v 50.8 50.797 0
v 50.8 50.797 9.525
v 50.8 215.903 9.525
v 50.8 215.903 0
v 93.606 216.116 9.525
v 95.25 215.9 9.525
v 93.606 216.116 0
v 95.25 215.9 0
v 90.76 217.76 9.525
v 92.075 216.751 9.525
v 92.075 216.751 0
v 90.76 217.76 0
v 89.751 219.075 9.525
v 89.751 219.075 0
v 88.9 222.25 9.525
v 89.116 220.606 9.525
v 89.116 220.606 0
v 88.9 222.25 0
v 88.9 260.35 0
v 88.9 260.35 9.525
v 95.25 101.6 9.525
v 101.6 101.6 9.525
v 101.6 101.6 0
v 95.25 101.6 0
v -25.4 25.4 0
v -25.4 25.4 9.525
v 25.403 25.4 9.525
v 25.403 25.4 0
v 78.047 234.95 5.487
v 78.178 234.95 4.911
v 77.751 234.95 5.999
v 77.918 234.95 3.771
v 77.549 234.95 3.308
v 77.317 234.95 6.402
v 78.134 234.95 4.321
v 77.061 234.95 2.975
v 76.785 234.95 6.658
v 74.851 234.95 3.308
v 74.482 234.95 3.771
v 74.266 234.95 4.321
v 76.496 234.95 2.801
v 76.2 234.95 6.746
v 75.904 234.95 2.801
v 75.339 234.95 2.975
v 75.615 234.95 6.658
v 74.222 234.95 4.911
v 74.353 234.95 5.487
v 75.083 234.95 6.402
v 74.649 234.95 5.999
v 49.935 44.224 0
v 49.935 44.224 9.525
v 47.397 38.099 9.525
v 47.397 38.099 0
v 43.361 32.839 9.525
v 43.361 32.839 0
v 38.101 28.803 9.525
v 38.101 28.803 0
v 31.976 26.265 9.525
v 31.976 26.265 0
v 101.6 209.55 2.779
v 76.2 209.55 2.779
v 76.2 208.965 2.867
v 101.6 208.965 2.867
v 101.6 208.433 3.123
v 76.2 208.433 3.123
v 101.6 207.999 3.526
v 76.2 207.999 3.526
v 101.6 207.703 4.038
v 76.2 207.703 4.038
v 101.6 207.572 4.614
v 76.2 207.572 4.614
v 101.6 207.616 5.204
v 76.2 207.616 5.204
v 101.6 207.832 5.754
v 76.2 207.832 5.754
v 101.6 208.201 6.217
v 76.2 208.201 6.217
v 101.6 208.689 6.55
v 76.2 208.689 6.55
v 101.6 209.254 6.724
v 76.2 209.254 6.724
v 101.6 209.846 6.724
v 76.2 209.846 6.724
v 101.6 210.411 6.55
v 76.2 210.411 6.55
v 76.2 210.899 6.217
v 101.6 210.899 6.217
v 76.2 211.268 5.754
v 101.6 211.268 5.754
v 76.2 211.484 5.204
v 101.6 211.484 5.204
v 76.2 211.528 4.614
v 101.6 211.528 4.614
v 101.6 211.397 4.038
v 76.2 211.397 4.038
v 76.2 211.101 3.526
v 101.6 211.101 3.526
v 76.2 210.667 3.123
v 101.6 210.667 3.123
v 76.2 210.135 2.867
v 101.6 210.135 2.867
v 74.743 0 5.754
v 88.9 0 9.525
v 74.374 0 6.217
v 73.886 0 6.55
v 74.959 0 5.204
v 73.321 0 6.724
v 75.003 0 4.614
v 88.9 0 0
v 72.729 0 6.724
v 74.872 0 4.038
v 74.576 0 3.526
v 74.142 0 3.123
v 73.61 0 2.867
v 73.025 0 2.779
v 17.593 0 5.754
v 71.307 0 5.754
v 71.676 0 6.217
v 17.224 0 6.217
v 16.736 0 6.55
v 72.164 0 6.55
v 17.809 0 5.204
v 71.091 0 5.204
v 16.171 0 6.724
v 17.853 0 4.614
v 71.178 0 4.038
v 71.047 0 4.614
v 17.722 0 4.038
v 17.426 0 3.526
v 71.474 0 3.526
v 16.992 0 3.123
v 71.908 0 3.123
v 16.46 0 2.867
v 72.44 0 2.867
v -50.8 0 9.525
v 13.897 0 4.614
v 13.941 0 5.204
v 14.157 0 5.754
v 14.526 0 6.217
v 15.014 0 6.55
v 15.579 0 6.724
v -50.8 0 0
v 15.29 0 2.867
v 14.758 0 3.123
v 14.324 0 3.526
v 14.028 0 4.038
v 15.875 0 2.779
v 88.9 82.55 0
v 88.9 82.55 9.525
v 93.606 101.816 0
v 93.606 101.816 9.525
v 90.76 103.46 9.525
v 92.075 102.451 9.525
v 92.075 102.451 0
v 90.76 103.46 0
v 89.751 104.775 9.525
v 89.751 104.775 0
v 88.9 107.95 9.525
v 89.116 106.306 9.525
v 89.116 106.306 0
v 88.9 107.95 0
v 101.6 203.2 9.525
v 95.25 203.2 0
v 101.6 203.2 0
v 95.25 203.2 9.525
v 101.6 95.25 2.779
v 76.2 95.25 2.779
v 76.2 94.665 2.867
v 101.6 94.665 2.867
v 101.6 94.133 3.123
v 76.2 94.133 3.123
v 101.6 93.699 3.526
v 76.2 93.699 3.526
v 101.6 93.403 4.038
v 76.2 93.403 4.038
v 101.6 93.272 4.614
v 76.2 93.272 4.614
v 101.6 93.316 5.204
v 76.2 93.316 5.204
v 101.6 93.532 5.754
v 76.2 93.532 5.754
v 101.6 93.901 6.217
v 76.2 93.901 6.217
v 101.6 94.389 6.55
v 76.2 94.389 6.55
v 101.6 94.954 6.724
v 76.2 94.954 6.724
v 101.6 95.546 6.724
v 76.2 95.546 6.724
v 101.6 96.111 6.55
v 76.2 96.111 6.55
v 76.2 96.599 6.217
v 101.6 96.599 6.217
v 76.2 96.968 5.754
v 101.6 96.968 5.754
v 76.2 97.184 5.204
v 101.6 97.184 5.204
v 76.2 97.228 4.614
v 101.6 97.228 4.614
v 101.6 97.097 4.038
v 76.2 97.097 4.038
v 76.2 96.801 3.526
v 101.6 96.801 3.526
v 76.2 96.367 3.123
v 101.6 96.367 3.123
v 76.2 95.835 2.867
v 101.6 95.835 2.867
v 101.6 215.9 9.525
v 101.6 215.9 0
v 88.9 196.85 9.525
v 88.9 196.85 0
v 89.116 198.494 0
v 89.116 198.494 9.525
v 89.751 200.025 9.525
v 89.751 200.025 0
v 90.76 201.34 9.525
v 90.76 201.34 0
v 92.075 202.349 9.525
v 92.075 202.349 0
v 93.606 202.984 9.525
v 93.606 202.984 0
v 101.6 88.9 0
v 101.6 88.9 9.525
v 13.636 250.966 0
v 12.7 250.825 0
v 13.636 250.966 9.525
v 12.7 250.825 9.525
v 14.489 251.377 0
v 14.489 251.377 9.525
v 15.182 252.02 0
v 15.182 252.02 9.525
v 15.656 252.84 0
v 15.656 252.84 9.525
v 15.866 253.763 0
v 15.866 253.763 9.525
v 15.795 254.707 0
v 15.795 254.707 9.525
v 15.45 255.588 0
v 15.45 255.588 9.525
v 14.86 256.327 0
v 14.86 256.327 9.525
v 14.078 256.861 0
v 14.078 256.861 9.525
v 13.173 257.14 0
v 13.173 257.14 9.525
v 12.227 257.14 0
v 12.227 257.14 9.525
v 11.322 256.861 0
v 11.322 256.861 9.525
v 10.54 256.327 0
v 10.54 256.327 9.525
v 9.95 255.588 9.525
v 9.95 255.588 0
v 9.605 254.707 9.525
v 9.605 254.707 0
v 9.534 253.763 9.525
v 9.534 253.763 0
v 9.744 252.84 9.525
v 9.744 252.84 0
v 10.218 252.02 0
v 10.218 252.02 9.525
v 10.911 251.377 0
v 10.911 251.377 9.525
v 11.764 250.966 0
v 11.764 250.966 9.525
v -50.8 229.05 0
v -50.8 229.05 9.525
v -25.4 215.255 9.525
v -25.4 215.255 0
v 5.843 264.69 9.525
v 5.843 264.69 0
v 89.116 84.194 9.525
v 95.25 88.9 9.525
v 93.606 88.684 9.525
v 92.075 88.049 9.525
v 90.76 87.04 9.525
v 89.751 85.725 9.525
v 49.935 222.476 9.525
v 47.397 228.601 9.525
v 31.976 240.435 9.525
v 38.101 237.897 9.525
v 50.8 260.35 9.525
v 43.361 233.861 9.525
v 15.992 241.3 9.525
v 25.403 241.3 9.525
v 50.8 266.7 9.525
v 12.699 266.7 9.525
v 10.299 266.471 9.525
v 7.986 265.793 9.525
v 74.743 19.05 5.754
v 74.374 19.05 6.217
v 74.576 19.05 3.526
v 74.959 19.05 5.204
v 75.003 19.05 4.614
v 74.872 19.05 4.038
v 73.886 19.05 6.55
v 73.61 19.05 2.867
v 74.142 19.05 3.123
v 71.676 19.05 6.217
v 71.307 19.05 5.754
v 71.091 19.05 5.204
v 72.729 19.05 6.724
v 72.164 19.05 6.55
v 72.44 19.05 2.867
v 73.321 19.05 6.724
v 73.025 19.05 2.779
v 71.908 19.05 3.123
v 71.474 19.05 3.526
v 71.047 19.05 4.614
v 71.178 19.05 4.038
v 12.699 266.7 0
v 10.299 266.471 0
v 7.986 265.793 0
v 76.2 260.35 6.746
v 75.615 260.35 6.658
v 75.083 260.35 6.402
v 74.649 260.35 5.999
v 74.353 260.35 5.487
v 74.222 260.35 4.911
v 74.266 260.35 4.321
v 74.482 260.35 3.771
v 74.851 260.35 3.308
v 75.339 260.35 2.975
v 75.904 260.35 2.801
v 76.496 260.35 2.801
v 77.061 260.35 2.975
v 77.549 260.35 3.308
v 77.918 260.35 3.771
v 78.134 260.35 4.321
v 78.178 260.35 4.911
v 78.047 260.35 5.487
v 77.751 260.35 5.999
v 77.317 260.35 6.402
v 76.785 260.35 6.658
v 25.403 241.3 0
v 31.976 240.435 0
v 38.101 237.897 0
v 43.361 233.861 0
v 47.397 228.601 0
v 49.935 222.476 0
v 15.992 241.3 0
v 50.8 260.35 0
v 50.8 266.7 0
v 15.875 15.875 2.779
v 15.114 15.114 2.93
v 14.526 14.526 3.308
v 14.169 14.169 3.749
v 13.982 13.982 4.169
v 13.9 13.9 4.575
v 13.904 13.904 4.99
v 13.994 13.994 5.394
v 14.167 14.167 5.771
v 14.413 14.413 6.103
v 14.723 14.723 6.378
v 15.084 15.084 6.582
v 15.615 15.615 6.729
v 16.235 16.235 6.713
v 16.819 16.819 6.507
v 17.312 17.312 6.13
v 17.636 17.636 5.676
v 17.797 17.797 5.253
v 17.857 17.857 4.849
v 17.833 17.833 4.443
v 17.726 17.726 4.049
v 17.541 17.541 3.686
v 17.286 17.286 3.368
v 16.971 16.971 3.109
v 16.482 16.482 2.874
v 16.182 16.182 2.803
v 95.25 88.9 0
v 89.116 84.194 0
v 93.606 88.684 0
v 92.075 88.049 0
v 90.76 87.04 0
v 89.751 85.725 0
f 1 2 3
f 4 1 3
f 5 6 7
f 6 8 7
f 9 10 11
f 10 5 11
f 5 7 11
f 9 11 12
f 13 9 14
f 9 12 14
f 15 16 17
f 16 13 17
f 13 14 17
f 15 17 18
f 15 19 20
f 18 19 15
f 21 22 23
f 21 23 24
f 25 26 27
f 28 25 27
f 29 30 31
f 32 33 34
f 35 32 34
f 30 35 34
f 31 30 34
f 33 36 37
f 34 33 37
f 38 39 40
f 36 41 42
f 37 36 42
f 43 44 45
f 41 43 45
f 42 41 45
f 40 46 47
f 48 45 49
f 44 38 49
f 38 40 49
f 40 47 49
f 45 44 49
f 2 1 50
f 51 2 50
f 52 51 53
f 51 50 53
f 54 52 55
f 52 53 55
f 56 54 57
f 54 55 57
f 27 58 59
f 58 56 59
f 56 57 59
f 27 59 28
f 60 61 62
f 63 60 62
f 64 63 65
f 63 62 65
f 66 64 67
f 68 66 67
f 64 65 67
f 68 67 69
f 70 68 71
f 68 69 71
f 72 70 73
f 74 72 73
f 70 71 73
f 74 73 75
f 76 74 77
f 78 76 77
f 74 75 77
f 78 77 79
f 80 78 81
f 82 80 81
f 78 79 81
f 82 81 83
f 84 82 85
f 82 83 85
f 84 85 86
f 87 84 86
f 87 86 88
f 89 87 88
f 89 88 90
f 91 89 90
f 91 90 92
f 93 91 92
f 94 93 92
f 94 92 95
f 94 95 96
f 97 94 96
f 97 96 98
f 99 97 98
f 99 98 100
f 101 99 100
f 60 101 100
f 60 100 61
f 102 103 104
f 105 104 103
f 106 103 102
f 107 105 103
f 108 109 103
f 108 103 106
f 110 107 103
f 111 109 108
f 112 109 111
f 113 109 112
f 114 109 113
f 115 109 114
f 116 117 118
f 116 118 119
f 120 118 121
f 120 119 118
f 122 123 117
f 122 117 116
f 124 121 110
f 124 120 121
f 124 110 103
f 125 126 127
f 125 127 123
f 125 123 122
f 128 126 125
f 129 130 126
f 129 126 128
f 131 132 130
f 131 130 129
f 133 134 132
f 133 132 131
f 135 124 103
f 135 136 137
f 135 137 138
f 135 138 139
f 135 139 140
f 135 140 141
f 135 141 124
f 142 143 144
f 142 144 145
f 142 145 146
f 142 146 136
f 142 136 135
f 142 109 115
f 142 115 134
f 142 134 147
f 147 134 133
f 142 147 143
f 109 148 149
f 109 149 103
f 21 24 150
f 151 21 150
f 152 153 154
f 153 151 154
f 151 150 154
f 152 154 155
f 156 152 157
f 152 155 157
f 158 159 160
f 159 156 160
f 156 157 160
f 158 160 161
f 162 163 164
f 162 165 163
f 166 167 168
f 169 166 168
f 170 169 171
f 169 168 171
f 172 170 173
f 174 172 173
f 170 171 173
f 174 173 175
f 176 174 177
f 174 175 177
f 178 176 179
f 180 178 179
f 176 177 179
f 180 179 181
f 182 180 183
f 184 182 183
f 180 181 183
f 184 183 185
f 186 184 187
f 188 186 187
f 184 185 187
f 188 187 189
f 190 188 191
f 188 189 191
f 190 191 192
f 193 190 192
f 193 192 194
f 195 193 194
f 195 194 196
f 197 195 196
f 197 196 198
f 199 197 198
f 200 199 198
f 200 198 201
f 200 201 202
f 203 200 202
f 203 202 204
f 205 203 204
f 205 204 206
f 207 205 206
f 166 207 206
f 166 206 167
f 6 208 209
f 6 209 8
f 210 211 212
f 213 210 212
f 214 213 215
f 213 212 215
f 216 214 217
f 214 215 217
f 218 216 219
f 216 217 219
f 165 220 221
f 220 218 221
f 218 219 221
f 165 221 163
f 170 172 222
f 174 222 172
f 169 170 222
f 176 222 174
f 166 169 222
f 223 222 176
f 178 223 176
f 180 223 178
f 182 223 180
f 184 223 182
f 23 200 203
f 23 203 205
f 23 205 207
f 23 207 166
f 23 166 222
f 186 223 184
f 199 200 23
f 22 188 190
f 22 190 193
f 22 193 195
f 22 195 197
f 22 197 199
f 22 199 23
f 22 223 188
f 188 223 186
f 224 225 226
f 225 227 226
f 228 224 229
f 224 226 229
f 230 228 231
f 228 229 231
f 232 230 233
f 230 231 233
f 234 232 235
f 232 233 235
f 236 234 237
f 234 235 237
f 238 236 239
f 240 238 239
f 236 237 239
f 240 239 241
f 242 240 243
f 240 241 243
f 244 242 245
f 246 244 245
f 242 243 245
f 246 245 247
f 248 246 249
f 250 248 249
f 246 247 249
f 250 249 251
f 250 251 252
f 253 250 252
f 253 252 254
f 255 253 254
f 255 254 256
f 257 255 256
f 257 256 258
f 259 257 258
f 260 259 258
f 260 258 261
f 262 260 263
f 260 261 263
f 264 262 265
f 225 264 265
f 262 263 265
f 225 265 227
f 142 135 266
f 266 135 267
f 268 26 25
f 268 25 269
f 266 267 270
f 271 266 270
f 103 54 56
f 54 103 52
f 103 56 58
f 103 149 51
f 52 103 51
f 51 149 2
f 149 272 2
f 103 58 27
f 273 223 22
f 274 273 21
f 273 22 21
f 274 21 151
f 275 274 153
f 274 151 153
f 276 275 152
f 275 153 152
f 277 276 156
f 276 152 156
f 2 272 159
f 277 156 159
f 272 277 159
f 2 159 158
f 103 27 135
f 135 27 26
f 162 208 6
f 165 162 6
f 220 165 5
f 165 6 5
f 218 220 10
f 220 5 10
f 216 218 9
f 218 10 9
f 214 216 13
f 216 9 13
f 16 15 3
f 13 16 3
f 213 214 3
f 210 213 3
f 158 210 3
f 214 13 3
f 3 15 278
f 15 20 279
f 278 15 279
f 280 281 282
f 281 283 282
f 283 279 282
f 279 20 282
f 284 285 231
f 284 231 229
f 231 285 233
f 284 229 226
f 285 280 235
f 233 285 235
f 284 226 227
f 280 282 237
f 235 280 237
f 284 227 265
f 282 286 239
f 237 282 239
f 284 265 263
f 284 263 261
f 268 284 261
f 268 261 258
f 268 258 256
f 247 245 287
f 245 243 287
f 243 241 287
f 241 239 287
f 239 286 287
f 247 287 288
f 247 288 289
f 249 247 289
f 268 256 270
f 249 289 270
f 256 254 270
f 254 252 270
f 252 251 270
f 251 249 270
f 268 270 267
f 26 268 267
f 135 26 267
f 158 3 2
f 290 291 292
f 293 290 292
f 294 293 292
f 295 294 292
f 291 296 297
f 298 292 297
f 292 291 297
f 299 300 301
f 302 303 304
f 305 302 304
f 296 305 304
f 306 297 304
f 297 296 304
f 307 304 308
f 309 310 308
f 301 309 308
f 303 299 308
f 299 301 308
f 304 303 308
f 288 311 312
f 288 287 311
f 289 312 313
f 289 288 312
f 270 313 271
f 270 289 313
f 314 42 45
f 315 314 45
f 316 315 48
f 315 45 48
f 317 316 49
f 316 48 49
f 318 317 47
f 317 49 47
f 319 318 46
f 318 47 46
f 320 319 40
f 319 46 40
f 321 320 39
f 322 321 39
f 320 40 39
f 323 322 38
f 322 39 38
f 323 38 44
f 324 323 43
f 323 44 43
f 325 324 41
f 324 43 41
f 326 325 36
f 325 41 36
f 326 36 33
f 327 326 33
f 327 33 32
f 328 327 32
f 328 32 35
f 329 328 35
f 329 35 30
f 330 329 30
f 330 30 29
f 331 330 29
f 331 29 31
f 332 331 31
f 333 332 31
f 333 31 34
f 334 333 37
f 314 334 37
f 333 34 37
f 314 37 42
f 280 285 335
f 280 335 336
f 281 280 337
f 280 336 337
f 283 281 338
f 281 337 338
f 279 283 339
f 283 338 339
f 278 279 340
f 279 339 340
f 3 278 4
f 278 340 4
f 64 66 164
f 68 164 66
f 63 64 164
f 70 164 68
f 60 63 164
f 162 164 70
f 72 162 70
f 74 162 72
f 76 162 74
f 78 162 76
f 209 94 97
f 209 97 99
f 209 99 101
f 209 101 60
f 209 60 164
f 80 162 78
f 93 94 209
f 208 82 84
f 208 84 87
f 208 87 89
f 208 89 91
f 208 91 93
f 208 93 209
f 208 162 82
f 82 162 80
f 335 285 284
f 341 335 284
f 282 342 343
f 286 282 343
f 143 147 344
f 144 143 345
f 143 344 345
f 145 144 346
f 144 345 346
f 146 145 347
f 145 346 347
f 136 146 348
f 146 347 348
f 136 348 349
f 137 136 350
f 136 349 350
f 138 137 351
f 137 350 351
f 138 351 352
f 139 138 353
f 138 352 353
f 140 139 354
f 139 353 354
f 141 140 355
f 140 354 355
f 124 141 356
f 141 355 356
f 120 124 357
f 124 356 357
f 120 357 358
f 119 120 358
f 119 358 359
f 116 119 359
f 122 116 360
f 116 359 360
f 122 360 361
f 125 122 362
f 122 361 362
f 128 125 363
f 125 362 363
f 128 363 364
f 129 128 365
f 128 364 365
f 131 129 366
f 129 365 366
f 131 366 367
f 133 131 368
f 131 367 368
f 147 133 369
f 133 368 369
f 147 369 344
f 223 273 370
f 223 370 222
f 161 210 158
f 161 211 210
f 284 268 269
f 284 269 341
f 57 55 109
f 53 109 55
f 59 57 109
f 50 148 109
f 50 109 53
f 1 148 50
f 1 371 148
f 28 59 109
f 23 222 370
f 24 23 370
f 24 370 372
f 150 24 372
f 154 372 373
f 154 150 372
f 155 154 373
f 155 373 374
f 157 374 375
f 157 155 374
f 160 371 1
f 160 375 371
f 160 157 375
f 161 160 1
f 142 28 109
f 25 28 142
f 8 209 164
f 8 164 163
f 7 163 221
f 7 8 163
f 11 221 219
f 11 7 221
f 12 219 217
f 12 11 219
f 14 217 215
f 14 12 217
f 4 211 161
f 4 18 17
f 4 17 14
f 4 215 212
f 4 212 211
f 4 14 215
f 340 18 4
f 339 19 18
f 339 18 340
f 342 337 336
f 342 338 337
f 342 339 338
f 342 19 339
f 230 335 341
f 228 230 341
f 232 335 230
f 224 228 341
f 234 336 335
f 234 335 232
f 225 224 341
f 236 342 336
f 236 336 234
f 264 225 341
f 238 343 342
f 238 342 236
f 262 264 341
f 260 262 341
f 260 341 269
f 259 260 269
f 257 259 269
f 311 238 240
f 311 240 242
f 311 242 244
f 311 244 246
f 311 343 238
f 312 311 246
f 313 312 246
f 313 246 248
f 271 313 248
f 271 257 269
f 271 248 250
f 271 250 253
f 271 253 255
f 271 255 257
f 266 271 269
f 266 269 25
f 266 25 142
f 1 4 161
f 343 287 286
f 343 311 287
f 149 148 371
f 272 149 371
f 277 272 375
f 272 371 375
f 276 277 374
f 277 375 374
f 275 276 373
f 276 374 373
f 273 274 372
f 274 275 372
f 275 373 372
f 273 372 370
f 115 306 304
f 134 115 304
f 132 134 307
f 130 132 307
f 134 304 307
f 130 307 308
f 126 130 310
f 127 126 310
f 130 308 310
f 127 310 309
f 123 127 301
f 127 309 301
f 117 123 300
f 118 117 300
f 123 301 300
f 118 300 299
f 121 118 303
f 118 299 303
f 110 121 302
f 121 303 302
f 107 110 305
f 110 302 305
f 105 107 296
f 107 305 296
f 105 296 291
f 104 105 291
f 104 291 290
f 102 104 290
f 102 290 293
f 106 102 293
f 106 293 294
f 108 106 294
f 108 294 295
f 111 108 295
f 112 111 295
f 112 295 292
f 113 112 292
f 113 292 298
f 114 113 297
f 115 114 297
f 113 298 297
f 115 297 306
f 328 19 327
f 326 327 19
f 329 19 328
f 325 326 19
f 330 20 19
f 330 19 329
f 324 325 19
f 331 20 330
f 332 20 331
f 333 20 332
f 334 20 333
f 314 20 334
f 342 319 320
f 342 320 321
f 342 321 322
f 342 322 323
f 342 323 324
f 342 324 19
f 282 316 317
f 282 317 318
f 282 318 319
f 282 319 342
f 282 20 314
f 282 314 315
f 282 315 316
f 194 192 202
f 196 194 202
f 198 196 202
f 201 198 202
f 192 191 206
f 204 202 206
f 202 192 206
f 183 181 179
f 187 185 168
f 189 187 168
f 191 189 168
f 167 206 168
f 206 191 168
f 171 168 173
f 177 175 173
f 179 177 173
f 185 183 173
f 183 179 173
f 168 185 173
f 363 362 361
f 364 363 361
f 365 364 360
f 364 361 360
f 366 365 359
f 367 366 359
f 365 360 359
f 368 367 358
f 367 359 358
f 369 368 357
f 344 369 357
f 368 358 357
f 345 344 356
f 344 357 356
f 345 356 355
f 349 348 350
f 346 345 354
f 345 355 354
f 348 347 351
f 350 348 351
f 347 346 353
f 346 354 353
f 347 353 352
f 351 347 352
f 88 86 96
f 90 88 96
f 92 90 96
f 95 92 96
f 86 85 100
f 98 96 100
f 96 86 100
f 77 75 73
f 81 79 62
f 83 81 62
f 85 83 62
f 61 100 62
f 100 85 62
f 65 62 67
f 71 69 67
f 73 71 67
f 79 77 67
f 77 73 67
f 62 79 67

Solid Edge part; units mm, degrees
sketch "Sketch1" plane through (0, 0, 0) normal (0, 0, 1) x (1, 0, 0)
  line L0 (0, 0) -> (0, 266.7)
  line L1 (0, 266.7) -> (88.9, 266.7)
  line L2 (88.9, 266.7) -> (88.9, 0)
  line L3 (88.9, 0) -> (0, 0)
  dimension "D1" = 88.9
  dimension "D2" = 266.7
extrude "Protrusion1" add sketch "Sketch1" along normal blind 9.525
sketch "Sketch2" plane through (38.1, 127, 9.525) normal (0, 0, 1) x (1, 0, 0)
  line L0 (-38.1, 114.3) -> (-38.1, -101.6)
  line L1 (-38.1, -101.6) -> (12.7, -101.6)
  line L2 (12.7, -101.6) -> (12.7, 114.3)
  line L3 (12.7, 114.3) -> (-38.1, 114.3)
  dimension "D1" = 25.4
  dimension "D2" = 25.4
  dimension "D3" = 50.8
extrude "Cutout1" cut sketch "Sketch2" against normal through all
hole "Hole_1" at (12.7, 254, 9.525) direction (0, 0, -1) diameter 6.35 end through all
fillet "Round_1" radius 12.7 2 edges at (0, 266.7, 4.7625) (0, 241.3, 4.7625)
fillet "Round_2" radius 25.4 3 edges at (50.8, 241.3, 4.7625) (50.8, 25.4, 4.7625) (0, 25.4, 4.7625)
hole "Hole_9" at (73.025, 0, 4.7625) direction (0, 1, 0) diameter 3.9675 depth 19.05
hole "Hole1" at (15.875, 0, 4.7625) direction (0, 1, 0) diameter 3.9675 depth 19.05
sketch "Sketch3" plane through (44.45, 133.35, 9.525) normal (0, 0, 1) x (1, 0, 0)
  line L0 (44.45, 133.35) -> (44.45, 127)
  line L1 (44.45, 127) -> (6.35, 127)
  line L2 (6.35, 127) -> (6.35, 133.35)
  line L3 (6.35, 133.35) -> (44.45, 133.35)
  dimension "D1" = 38.1
  dimension "D2" = 6.35
extrude "Cutout2" cut sketch "Sketch3" against normal through all
hole "Hole_3" at (76.2, 260.35, 4.7625) direction (0, -1, 0) diameter 3.9675 depth 25.4
sketch "Sketch4" plane through (44.45, 133.35, 9.525) normal (0, 0, 1) x (0, 1, 0)
  line L0 (69.85, -44.45) -> (69.85, -57.15)
  line L1 (69.85, -57.15) -> (82.55, -57.15)
  line L2 (82.55, -57.15) -> (82.55, -44.45)
  line L3 (82.55, -44.45) -> (69.85, -44.45)
  line L4 (-44.45, -44.45) -> (-44.45, -57.15)
  line L5 (-44.45, -57.15) -> (-31.75, -57.15)
  line L6 (-31.75, -57.15) -> (-31.75, -44.45)
  line L7 (-31.75, -44.45) -> (-44.45, -44.45)
  dimension "D1" = 12.7
  dimension "D2" = 12.7
  dimension "D3" = 88.9
  dimension "D4" = 12.7
  dimension "D5" = 12.7
  dimension "D6" = 101.6
extrude "ExtrudedProtrusion_2" add sketch "Sketch4" against normal blind 9.525
hole "Hole2" at (101.6, 95.25, 4.7625) direction (-1, 0, 0) diameter 3.9675 depth 25.4
hole "Hole3" at (101.6, 209.55, 4.7625) direction (-1, 0, 0) diameter 3.9675 depth 25.4
fillet "Round_3" radius 6.35 4 edges at (88.9, 88.9, 4.7625) (88.9, 101.6, 4.7625) (88.9, 203.2, 4.7625) (88.9, 215.9, 4.7625)
sketch "Sketch5" plane through (50.8, 133.35, 9.525) normal (0, 0, 1) x (1, 0, 0)
  line L0 (-101.6, 95.6996) -> (-44.8636, 131.3992)
  arc A0 (-38.1, 107.95) -> (-44.8636, 131.3992) centre (-38.1, 120.65) cw
  line L1 (-38.1, 107.95) -> (-34.8078, 107.95)
  line L2 (-76.2, 81.9053) -> (-34.8078, 107.95)
  line L3 (-76.2, -107.95) -> (-76.2, 81.9053)
  line L4 (-25.4, -107.95) -> (-76.2, -107.95)
  line L5 (-25.4, -107.95) -> (-50.8, -133.35)
  line L6 (-50.8, -133.35) -> (-101.6, -133.35)
  line L7 (-101.6, -133.35) -> (-101.6, 95.6996)
extrude "ExtrudedProtrusion_3" add sketch "Sketch5" against normal blind 9.525
properties part number "CHAS-02"
